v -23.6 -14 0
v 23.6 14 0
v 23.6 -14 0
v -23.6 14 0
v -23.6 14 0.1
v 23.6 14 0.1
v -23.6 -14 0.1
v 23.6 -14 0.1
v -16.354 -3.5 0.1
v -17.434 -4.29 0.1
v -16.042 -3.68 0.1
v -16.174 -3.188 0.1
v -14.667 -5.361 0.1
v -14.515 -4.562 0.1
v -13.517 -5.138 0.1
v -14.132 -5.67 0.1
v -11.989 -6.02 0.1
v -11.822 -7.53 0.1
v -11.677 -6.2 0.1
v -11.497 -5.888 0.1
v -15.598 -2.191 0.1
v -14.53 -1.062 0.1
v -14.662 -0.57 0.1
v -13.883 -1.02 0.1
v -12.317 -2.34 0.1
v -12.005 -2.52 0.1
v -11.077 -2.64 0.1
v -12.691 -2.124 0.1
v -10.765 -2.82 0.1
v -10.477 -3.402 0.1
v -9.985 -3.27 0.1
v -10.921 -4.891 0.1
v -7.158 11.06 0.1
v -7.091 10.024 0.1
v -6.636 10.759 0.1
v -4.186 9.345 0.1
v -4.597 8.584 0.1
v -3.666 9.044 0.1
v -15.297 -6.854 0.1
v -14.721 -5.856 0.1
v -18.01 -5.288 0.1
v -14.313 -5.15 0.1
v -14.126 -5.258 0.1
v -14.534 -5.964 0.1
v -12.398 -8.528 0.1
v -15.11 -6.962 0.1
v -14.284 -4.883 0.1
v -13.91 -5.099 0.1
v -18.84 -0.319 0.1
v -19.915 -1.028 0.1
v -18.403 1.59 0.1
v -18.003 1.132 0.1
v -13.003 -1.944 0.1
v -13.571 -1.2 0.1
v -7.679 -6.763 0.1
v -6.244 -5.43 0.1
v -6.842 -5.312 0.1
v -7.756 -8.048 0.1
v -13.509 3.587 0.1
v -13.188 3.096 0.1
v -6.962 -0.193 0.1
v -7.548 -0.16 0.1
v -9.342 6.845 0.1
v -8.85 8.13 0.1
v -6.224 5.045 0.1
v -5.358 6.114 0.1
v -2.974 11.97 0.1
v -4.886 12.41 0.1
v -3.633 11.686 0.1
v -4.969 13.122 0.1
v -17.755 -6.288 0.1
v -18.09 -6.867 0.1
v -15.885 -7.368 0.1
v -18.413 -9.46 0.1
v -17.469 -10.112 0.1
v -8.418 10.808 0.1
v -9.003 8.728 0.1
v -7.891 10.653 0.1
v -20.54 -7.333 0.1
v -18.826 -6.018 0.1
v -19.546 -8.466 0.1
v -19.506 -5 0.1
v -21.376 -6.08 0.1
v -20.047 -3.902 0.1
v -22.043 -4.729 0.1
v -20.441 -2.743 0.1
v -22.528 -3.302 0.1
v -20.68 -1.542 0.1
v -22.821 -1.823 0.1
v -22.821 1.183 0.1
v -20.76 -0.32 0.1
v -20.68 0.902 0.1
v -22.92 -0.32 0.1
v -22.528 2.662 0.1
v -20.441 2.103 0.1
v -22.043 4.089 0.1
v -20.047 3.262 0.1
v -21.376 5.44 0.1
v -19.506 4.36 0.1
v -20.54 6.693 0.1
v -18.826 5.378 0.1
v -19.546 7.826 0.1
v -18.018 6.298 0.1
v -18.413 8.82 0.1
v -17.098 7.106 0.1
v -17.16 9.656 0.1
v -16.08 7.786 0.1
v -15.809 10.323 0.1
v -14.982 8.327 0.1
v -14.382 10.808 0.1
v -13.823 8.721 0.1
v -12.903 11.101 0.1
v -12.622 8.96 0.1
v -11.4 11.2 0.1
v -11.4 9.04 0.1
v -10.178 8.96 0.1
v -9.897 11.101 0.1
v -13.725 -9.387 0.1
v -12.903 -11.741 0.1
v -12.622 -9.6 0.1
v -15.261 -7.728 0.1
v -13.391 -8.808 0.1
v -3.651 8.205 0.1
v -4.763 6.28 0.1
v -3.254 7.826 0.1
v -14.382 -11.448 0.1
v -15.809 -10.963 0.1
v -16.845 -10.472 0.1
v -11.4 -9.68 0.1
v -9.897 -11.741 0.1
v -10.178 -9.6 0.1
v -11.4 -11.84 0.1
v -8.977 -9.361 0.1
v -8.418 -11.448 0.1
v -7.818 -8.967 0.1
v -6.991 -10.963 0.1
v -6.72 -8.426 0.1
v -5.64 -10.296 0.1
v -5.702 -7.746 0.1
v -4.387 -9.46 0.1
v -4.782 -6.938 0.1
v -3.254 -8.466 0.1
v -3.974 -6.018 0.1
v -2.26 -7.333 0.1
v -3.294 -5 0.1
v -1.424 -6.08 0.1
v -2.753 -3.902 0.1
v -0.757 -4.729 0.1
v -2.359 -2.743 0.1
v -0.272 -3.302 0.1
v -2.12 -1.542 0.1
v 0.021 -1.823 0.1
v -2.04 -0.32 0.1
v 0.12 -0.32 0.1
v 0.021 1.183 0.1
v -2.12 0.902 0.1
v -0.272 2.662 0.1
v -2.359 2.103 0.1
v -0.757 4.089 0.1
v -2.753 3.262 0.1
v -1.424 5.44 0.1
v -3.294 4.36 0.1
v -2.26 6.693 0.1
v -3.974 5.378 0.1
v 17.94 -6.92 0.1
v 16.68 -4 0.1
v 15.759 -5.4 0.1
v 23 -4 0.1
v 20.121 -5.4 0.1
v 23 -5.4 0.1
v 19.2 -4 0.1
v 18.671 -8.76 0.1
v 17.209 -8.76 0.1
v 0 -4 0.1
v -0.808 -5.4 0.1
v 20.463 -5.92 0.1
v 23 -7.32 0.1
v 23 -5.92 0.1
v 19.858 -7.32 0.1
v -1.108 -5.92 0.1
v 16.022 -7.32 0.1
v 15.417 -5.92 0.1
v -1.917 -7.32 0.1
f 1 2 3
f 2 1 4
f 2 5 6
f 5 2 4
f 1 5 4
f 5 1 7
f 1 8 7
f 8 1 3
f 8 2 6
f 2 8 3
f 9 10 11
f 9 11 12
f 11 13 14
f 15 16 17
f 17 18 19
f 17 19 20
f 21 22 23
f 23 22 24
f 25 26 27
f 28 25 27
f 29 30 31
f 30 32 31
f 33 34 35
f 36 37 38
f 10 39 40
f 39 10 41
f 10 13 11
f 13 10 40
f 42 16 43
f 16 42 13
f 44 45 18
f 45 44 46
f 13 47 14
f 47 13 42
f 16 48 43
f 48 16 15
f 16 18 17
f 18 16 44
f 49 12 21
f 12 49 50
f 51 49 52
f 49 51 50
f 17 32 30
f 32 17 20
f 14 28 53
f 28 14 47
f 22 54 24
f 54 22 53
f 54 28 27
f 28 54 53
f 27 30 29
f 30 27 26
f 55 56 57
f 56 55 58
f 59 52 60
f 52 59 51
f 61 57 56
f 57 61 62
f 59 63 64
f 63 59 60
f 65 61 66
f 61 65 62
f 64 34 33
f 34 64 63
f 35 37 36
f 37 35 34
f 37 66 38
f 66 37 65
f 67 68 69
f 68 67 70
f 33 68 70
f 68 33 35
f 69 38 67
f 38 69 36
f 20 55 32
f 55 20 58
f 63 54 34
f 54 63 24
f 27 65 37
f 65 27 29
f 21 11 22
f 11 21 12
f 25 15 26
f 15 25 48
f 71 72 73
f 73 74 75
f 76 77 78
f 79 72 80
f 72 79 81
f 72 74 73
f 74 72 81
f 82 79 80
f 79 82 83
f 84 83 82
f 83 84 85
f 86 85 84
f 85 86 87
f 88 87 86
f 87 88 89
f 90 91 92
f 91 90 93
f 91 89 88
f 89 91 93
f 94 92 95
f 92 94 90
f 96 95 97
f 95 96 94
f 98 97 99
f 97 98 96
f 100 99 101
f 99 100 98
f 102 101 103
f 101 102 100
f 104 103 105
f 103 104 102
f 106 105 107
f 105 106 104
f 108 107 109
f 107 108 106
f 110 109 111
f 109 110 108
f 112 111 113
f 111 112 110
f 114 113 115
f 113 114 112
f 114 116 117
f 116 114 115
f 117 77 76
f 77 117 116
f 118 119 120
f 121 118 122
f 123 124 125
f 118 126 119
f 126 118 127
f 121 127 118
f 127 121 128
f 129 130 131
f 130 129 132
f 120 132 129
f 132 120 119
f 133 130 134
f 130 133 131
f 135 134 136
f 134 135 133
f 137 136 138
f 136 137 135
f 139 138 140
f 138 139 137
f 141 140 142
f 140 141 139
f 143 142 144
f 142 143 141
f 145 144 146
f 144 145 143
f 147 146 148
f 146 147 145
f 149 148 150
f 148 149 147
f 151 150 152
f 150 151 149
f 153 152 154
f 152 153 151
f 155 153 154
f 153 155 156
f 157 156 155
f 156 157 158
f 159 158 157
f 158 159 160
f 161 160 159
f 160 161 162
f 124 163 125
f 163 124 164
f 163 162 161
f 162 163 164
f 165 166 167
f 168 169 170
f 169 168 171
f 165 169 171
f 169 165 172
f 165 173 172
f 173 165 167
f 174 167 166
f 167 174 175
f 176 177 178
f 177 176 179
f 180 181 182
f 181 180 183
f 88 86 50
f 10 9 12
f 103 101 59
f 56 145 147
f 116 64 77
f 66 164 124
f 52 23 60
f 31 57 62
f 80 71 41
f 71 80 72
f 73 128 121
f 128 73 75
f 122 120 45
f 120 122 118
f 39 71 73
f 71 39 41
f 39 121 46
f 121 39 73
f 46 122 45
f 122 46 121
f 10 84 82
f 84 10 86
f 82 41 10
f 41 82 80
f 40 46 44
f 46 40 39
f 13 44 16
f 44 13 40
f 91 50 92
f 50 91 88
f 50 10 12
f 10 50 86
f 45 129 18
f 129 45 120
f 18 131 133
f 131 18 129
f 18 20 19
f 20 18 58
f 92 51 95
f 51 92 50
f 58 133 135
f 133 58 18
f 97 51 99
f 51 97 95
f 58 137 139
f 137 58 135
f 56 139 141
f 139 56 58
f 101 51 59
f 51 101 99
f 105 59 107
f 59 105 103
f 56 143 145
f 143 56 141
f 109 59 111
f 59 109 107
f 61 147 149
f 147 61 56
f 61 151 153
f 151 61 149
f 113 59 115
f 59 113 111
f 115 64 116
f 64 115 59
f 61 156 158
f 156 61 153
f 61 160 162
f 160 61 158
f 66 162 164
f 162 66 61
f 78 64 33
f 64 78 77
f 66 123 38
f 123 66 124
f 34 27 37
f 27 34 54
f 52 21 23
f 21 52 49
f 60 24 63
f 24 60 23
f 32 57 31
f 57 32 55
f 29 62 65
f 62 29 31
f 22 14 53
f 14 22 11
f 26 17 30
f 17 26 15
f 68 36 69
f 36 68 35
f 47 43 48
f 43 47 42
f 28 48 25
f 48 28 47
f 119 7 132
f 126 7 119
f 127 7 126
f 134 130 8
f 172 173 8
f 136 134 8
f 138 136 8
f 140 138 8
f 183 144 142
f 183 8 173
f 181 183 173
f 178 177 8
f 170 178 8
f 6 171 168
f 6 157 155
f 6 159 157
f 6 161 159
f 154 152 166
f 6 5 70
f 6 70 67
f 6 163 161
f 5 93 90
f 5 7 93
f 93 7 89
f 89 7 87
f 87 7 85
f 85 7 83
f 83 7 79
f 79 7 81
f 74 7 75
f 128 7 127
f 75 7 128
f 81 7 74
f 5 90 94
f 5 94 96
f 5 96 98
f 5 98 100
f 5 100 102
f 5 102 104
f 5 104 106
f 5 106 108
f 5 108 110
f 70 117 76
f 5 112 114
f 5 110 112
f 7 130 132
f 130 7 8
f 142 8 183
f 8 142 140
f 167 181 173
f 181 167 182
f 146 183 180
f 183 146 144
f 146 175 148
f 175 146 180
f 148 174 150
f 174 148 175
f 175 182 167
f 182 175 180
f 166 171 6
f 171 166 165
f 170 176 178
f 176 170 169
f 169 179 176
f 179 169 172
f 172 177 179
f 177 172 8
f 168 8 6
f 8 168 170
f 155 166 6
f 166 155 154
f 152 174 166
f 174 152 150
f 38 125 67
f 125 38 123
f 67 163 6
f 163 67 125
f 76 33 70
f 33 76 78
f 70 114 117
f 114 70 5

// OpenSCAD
// file: ../p/logo-launchcommand-bg.scad
use <../lib.scad>
function ldraw_lib__logo_launchcommand_bg() = [
// 0 Launch Command Logo Background (without Border)
// 0 Name: logo-launchcommand-bg.dat
// 0 Author: Chris Böhnke [KnightOfTarenta]
// 0 !LDRAW_ORG Primitive UPDATE 2025-05
// 0 !LICENSE Licensed under CC BY 4.0 : see CAreadme.txt
// 
// 0 !HELP Dimensions X = 32; Z = 34.67
// 
// 0 BFC CERTIFY CCW
  [0,"BFC","CERTIFY"],
  [0,"BFC","CCW"],
// 
// 0 !HISTORY 2025-04-27 [OrionP] Official Update 2025-04
// 0 !HISTORY 2025-05-24 [Holly-Wood] Updated description
// 0 !HISTORY 2025-05-28 [OrionP] Official Update 2025-05
// 
// 0 // Colour 16 Main Colour
// 3 16 -12.889 0 -1.697 -12.557 0 -3.365 -11.826 0 -.984
  [3,16,-12.889,0,-1.697,-12.557,0,-3.365,-11.826,0,-.984],
// 3 16 -8.38 0 -5.514 -6.88 0 -4.417 -6.63 0 -3.984
  [3,16,-8.38,0,-5.514,-6.88,0,-4.417,-6.63,0,-3.984],
// 3 16 -9.192 0 9.192 -10.314 0 7.914 -2.929 0 5.426
  [3,16,-9.192,0,9.192,-10.314,0,7.914,-2.929,0,5.426],
// 3 16 7.161 0 -7.097 11.258 0 -6.5 12.01 0 -4.975
  [3,16,7.161,0,-7.097,11.258,0,-6.5,12.01,0,-4.975],
// 3 16 1.697 0 12.889 3.542 0 11.736 3.329 0 12.566
  [3,16,1.697,0,12.889,3.542,0,11.736,3.329,0,12.566],
// 3 16 8.392 0 8.936 10.314 0 7.914 9.218 0 9.166
  [3,16,8.392,0,8.936,10.314,0,7.914,9.218,0,9.166],
// 3 16 -9.171 0 2.016 -4.53 0 -.347 -2.483 0 4.744
  [3,16,-9.171,0,2.016,-4.53,0,-.347,-2.483,0,4.744],
// 3 16 1.965 0 -4.097 6.331 0 -6.934 5.35 0 .222
  [3,16,1.965,0,-4.097,6.331,0,-6.934,5.35,0,.222],
// 4 16 -9.18 0 -6.9 -10.314 0 -7.914 -9.291 0 -9.093 -8.827 0 -8.289
  [4,16,-9.18,0,-6.9,-10.314,0,-7.914,-9.291,0,-9.093,-8.827,0,-8.289],
// 4 16 -7.563 0 -14.1 -5.363 0 -10.289 -6.229 0 -9.789 -8.429 0 -13.6
  [4,16,-7.563,0,-14.1,-5.363,0,-10.289,-6.229,0,-9.789,-8.429,0,-13.6],
// 4 16 -1.386 0 -11.4 -2.765 0 -11.789 -3.229 0 -12.593 -1.697 0 -12.889
  [4,16,-1.386,0,-11.4,-2.765,0,-11.789,-3.229,0,-12.593,-1.697,0,-12.889],
// 4 16 -9.18 0 -6.9 -8.827 0 -8.289 -6.229 0 -9.789 -5.413 0 -9.075
  [4,16,-9.18,0,-6.9,-8.827,0,-8.289,-6.229,0,-9.789,-5.413,0,-9.075],
// 4 16 -5.413 0 -9.075 -6.229 0 -9.789 -5.363 0 -10.289 -5.153 0 -9.225
  [4,16,-5.413,0,-9.075,-6.229,0,-9.789,-5.363,0,-10.289,-5.153,0,-9.225],
// 4 16 -1.386 0 -11.4 -5.153 0 -9.225 -5.363 0 -10.289 -2.765 0 -11.789
  [4,16,-1.386,0,-11.4,-5.153,0,-9.225,-5.363,0,-10.289,-2.765,0,-11.789],
// 4 16 -12.557 0 -3.365 -12.01 0 -4.975 -11.258 0 -6.5 -8.38 0 -5.514
  [4,16,-12.557,0,-3.365,-12.01,0,-4.975,-11.258,0,-6.5,-8.38,0,-5.514],
// 4 16 -10.314 0 -7.914 -9.18 0 -6.9 -8.38 0 -5.514 -11.258 0 -6.5
  [4,16,-10.314,0,-7.914,-9.18,0,-6.9,-8.38,0,-5.514,-11.258,0,-6.5],
// 4 16 -4.613 0 -7.689 -5.413 0 -9.075 -5.153 0 -9.225 -4.353 0 -7.839
  [4,16,-4.613,0,-7.689,-5.413,0,-9.075,-5.153,0,-9.225,-4.353,0,-7.839],
// 4 16 -3.794 0 -7.431 -4.538 0 -7.001 -4.613 0 -7.689 -4.353 0 -7.839
  [4,16,-3.794,0,-7.431,-4.538,0,-7.001,-4.613,0,-7.689,-4.353,0,-7.839],
// 4 16 -12.889 0 -1.697 -11.826 0 -.984 -12.889 0 1.697 -13 0 0
  [4,16,-12.889,0,-1.697,-11.826,0,-.984,-12.889,0,1.697,-13,0,0],
// 4 16 -12.557 0 -3.365 -8.38 0 -5.514 -6.63 0 -3.984 -11.826 0 -.984
  [4,16,-12.557,0,-3.365,-8.38,0,-5.514,-6.63,0,-3.984,-11.826,0,-.984],
// 4 16 -1.697 0 -12.889 0 0 -13 -.586 0 -10.014 -1.386 0 -11.4
  [4,16,-1.697,0,-12.889,0,0,-13,-.586,0,-10.014,-1.386,0,-11.4],
// 4 16 0 0 -13 1.697 0 -12.889 3.365 0 -12.557 -.586 0 -10.014
  [4,16,0,0,-13,1.697,0,-12.889,3.365,0,-12.557,-.586,0,-10.014],
// 4 16 5.061 0 -10.734 -.135 0 -7.734 -.385 0 -8.167 -.586 0 -10.014
  [4,16,5.061,0,-10.734,-.135,0,-7.734,-.385,0,-8.167,-.586,0,-10.014],
// 4 16 -11.826 0 -.984 -9.726 0 2.653 -12.557 0 3.365 -12.889 0 1.697
  [4,16,-11.826,0,-.984,-9.726,0,2.653,-12.557,0,3.365,-12.889,0,1.697],
// 4 16 -.586 0 -10.014 3.365 0 -12.557 4.975 0 -12.01 5.061 0 -10.734
  [4,16,-.586,0,-10.014,3.365,0,-12.557,4.975,0,-12.01,5.061,0,-10.734],
// 4 16 -12.557 0 3.365 -9.726 0 2.653 -11.258 0 6.5 -12.01 0 4.975
  [4,16,-12.557,0,3.365,-9.726,0,2.653,-11.258,0,6.5,-12.01,0,4.975],
// 4 16 4.975 0 -12.01 6.5 0 -11.258 7.914 0 -10.314 5.061 0 -10.734
  [4,16,4.975,0,-12.01,6.5,0,-11.258,7.914,0,-10.314,5.061,0,-10.734],
// 4 16 5.061 0 -10.734 7.914 0 -10.314 9.192 0 -9.192 7.161 0 -7.097
  [4,16,5.061,0,-10.734,7.914,0,-10.314,9.192,0,-9.192,7.161,0,-7.097],
// 4 16 -11.258 0 6.5 -9.726 0 2.653 -2.929 0 5.426 -10.314 0 7.914
  [4,16,-11.258,0,6.5,-9.726,0,2.653,-2.929,0,5.426,-10.314,0,7.914],
// 4 16 -6.5 0 11.258 -7.914 0 10.314 -9.192 0 9.192 -2.929 0 5.426
  [4,16,-6.5,0,11.258,-7.914,0,10.314,-9.192,0,9.192,-2.929,0,5.426],
// 4 16 9.192 0 -9.192 10.314 0 -7.914 11.258 0 -6.5 7.161 0 -7.097
  [4,16,9.192,0,-9.192,10.314,0,-7.914,11.258,0,-6.5,7.161,0,-7.097],
// 4 16 -3.365 0 12.557 -4.975 0 12.01 -6.5 0 11.258 -2.929 0 5.426
  [4,16,-3.365,0,12.557,-4.975,0,12.01,-6.5,0,11.258,-2.929,0,5.426],
// 4 16 7.161 0 -7.097 12.01 0 -4.975 12.557 0 -3.365 6.164 0 .176
  [4,16,7.161,0,-7.097,12.01,0,-4.975,12.557,0,-3.365,6.164,0,.176],
// 4 16 12.557 0 -3.365 12.889 0 -1.697 13 0 0 6.164 0 .176
  [4,16,12.557,0,-3.365,12.889,0,-1.697,13,0,0,6.164,0,.176],
// 4 16 -3.365 0 12.557 -2.929 0 5.426 0 0 13 -1.697 0 12.889
  [4,16,-3.365,0,12.557,-2.929,0,5.426,0,0,13,-1.697,0,12.889],
// 4 16 -2.929 0 5.426 3.542 0 11.736 1.697 0 12.889 0 0 13
  [4,16,-2.929,0,5.426,3.542,0,11.736,1.697,0,12.889,0,0,13],
// 4 16 13 0 0 12.889 0 1.697 12.557 0 3.365 6.164 0 .176
  [4,16,13,0,0,12.889,0,1.697,12.557,0,3.365,6.164,0,.176],
// 4 16 11.258 0 6.5 6.164 0 .176 12.557 0 3.365 12.01 0 4.975
  [4,16,11.258,0,6.5,6.164,0,.176,12.557,0,3.365,12.01,0,4.975],
// 4 16 10.314 0 7.914 8.392 0 8.936 6.164 0 .176 11.258 0 6.5
  [4,16,10.314,0,7.914,8.392,0,8.936,6.164,0,.176,11.258,0,6.5],
// 4 16 5.892 0 15.806 4.873 0 15.24 3.329 0 12.566 3.542 0 11.736
  [4,16,5.892,0,15.806,4.873,0,15.24,3.329,0,12.566,3.542,0,11.736],
// 4 16 10.742 0 13.006 8.392 0 8.936 9.218 0 9.166 10.762 0 11.84
  [4,16,10.742,0,13.006,8.392,0,8.936,9.218,0,9.166,10.762,0,11.84],
// 4 16 .449 0 -3.222 9.449 0 12.367 5.985 0 14.367 -3.015 0 -1.222
  [4,16,.449,0,-3.222,9.449,0,12.367,5.985,0,14.367,-3.015,0,-1.222],
// 4 16 -10.334 0 .002 -5.83 0 -2.598 -4.53 0 -.347 -9.171 0 2.016
  [4,16,-10.334,0,.002,-5.83,0,-2.598,-4.53,0,-.347,-9.171,0,2.016],
// 4 16 2.859 0 9.952 -2.483 0 4.744 -4.53 0 -.347 -3.448 0 -.972
  [4,16,2.859,0,9.952,-2.483,0,4.744,-4.53,0,-.347,-3.448,0,-.972],
// 4 16 1.965 0 -4.097 .665 0 -6.348 5.168 0 -8.948 6.331 0 -6.934
  [4,16,1.965,0,-4.097,.665,0,-6.348,5.168,0,-8.948,6.331,0,-6.934],
// 4 16 7.189 0 7.452 .882 0 -3.472 1.965 0 -4.097 5.35 0 .222
  [4,16,7.189,0,7.452,.882,0,-3.472,1.965,0,-4.097,5.35,0,.222],
// 4 16 -6.447 0 -4.667 -4.326 0 -5.892 -2.226 0 -2.255 -4.347 0 -1.03
  [4,16,-6.447,0,-4.667,-4.326,0,-5.892,-2.226,0,-2.255,-4.347,0,-1.03],
// 4 16 -.818 0 -7.917 1.282 0 -4.28 -.84 0 -3.055 -2.94 0 -6.692
  [4,16,-.818,0,-7.917,1.282,0,-4.28,-.84,0,-3.055,-2.94,0,-6.692],
// 4 16 10.019 0 13.424 10.787 0 16.675 9.047 0 17.68 6.616 0 15.388
  [4,16,10.019,0,13.424,10.787,0,16.675,9.047,0,17.68,6.616,0,15.388],
// 4 16 -4.046 0 -6.708 -3.786 0 -6.858 -3.486 0 -6.638 -4.006 0 -6.338
  [4,16,-4.046,0,-6.708,-3.786,0,-6.858,-3.486,0,-6.638,-4.006,0,-6.338],
// 4 16 -3.486 0 -6.638 -1.273 0 -2.805 -1.793 0 -2.505 -4.006 0 -6.338
  [4,16,-3.486,0,-6.638,-1.273,0,-2.805,-1.793,0,-2.505,-4.006,0,-6.338],
];
module ldraw_lib__logo_launchcommand_bg(step=0, col=false, unit=2/5, alt=false, line=0.2, solid=!$preview)
    makepoly(ldraw_lib__logo_launchcommand_bg(), step=step, col=col, unit=unit, alt=alt, line=line, solid=solid);
ldraw_lib__logo_launchcommand_bg(line=0.2);
// file: ../p/box5-12.scad
use <../lib.scad>
function ldraw_lib__box5_12() = [
// 0 Box with 5 Faces without Any Edges
// 0 Name: box5-12.dat
// 0 Author: Chris Dee [cwdee]
// 0 !LDRAW_ORG Primitive UPDATE 2009-02
// 0 !LICENSE Licensed under CC BY 4.0 : see CAreadme.txt
// 
// 0 BFC CERTIFY CCW
  [0,"BFC","CERTIFY"],
  [0,"BFC","CCW"],
// 
// 0 !HISTORY 2009-09-03 [PTadmin] Official Update 2009-02
// 
// 
// 4 16 1 1 1 1 1 -1 -1 1 -1 -1 1 1
  [4,16,1,1,1,1,1,-1,-1,1,-1,-1,1,1],
// 4 16 -1 0 1 1 0 1 1 1 1 -1 1 1
  [4,16,-1,0,1,1,0,1,1,1,1,-1,1,1],
// 4 16 -1 0 -1 -1 0 1 -1 1 1 -1 1 -1
  [4,16,-1,0,-1,-1,0,1,-1,1,1,-1,1,-1],
// 4 16 1 0 -1 -1 0 -1 -1 1 -1 1 1 -1
  [4,16,1,0,-1,-1,0,-1,-1,1,-1,1,1,-1],
// 4 16 1 0 1 1 0 -1 1 1 -1 1 1 1
  [4,16,1,0,1,1,0,-1,1,1,-1,1,1,1],
// 0
];
module ldraw_lib__box5_12(step=0, col=false, unit=2/5, alt=false, line=0.2, solid=!$preview)
    makepoly(ldraw_lib__box5_12(), step=step, col=col, unit=unit, alt=alt, line=line, solid=solid);
ldraw_lib__box5_12(line=0.2);
// main file
use <../lib.scad>
use <../p/box5-12.scad>
use <../p/logo-launchcommand-bg.scad>
use <../p/logo-launchcommand.scad>
function ldraw_lib__169665j() = [
// 0 Sticker  3.5 x  5.9 with Launch Command Logo, Blue V and Red Lines
// 0 Name: 169665j.dat
// 0 Author: Chris Böhnke [KnightOfTarenta]
// 0 !LDRAW_ORG Part UPDATE 2026-06
// 0 !LICENSE Licensed under CC BY 4.0 : see CAreadme.txt
// 
// 0 !HELP place on back 3009.dat at 0 -12 -10
// 
// 0 BFC CERTIFY CCW
  [0,"BFC","CERTIFY"],
  [0,"BFC","CCW"],
// 
// 0 !KEYWORDS Bricklink 6339stk01, Brickowl 588738, Launch Command
// 0 !KEYWORDS Rebrickable 169665, set 6339, Shuttle Launch Pad, Sign Board
// 0 !KEYWORDS space port, stamp, town
// 
// 0 !HISTORY 2026-06-28 [OrionP] Official Update 2026-06
// 
// 0 // Sticker Base
// 1 16 0 -.25 0 59 0 0 0 .25 0 0 0 35 box5-12.dat
  [1,16,0,-.25,0,59,0,0,0,.25,0,0,0,35, ldraw_lib__box5_12()],
// 
// 0 // Pattern
// 0 BFC NOCLIP
  [0,"BFC","NOCLIP"],
// 1 16 -28.5 -.25 -.8 1.8 0 0 0 1 0 0 0 1.8 logo-launchcommand.dat
  [1,16,-28.5,-.25,-.8,1.8,0,0,0,1,0,0,0,1.8, ldraw_lib__logo_launchcommand()],
// 
// 0 // Colour 1 Blue
// 3 1 44.85 -.25 -17.3 41.7 -.25 -10 39.398 -.25 -13.5
  [3,1,44.85,-.25,-17.3,41.7,-.25,-10,39.398,-.25,-13.5],
// 4 1 57.5 -.25 -13.5 57.5 -.25 -10 48 -.25 -10 50.302 -.25 -13.5
  [4,1,57.5,-.25,-13.5,57.5,-.25,-10,48,-.25,-10,50.302,-.25,-13.5],
// 4 1 46.677 -.25 -21.9 50.302 -.25 -13.5 48 -.25 -10 44.85 -.25 -17.3
  [4,1,46.677,-.25,-21.9,50.302,-.25,-13.5,48,-.25,-10,44.85,-.25,-17.3],
// 4 1 46.677 -.25 -21.9 44.85 -.25 -17.3 39.398 -.25 -13.5 43.023 -.25 -21.9
  [4,1,46.677,-.25,-21.9,44.85,-.25,-17.3,39.398,-.25,-13.5,43.023,-.25,-21.9],
// 4 1 41.7 -.25 -10 0 -.25 -10 -2.021 -.25 -13.5 39.398 -.25 -13.5
  [4,1,41.7,-.25,-10,0,-.25,-10,-2.021,-.25,-13.5,39.398,-.25,-13.5],
// 
// 0 // Colour 4 Red
// 4 4 57.5 -.25 -14.8 51.157 -.25 -14.8 49.646 -.25 -18.3 57.5 -.25 -18.3
  [4,4,57.5,-.25,-14.8,51.157,-.25,-14.8,49.646,-.25,-18.3,57.5,-.25,-18.3],
// 4 4 38.543 -.25 -14.8 -2.771 -.25 -14.8 -4.792 -.25 -18.3 40.054 -.25 -18.3
  [4,4,38.543,-.25,-14.8,-2.771,-.25,-14.8,-4.792,-.25,-18.3,40.054,-.25,-18.3],
// 
// 0 BFC CLIP
  [0,"BFC","CLIP"],
// 0 // Colour 16 Main Colour
// 1 16 -28.5 -.25 -.8 1.8 0 0 0 1 0 0 0 1.8 logo-launchcommand-bg.dat
  [1,16,-28.5,-.25,-.8,1.8,0,0,0,1,0,0,0,1.8, ldraw_lib__logo_launchcommand_bg()],
// 3 16 -32.2584 -.25 -29.3534 -59 -.25 -35 -28.5 -.25 -29.6
  [3,16,-32.2584,-.25,-29.3534,-59,-.25,-35,-28.5,-.25,-29.6],
// 3 16 -35.9538 -.25 -28.619 -59 -.25 -35 -32.2584 -.25 -29.3534
  [3,16,-35.9538,-.25,-28.619,-59,-.25,-35,-32.2584,-.25,-29.3534],
// 3 16 -39.5214 -.25 -27.4076 -59 -.25 -35 -35.9538 -.25 -28.619
  [3,16,-39.5214,-.25,-27.4076,-59,-.25,-35,-35.9538,-.25,-28.619],
// 3 16 -21.0462 -.25 -28.619 -24.7416 -.25 -29.3534 59 -.25 -35
  [3,16,-21.0462,-.25,-28.619,-24.7416,-.25,-29.3534,59,-.25,-35],
// 3 16 46.677 -.25 -21.9 43.023 -.25 -21.9 59 -.25 -35
  [3,16,46.677,-.25,-21.9,43.023,-.25,-21.9,59,-.25,-35],
// 3 16 -17.4786 -.25 -27.4076 -21.0462 -.25 -28.619 59 -.25 -35
  [3,16,-17.4786,-.25,-27.4076,-21.0462,-.25,-28.619,59,-.25,-35],
// 3 16 -14.1 -.25 -25.7408 -17.4786 -.25 -27.4076 59 -.25 -35
  [3,16,-14.1,-.25,-25.7408,-17.4786,-.25,-27.4076,59,-.25,-35],
// 3 16 -10.968 -.25 -23.6492 -14.1 -.25 -25.7408 59 -.25 -35
  [3,16,-10.968,-.25,-23.6492,-14.1,-.25,-25.7408,59,-.25,-35],
// 3 16 -4.792 -.25 -18.3 -5.6508 -.25 -18.332 -8.1348 -.25 -21.1652
  [3,16,-4.792,-.25,-18.3,-5.6508,-.25,-18.332,-8.1348,-.25,-21.1652],
// 3 16 -4.792 -.25 -18.3 59 -.25 -35 43.023 -.25 -21.9
  [3,16,-4.792,-.25,-18.3,59,-.25,-35,43.023,-.25,-21.9],
// 3 16 40.054 -.25 -18.3 -4.792 -.25 -18.3 43.023 -.25 -21.9
  [3,16,40.054,-.25,-18.3,-4.792,-.25,-18.3,43.023,-.25,-21.9],
// 3 16 57.5 -.25 -14.8 57.5 -.25 -18.3 59 -.25 -35
  [3,16,57.5,-.25,-14.8,57.5,-.25,-18.3,59,-.25,-35],
// 3 16 57.5 -.25 -13.5 57.5 -.25 -14.8 59 -.25 -35
  [3,16,57.5,-.25,-13.5,57.5,-.25,-14.8,59,-.25,-35],
// 3 16 59 -.25 35 48 -.25 -10 57.5 -.25 -10
  [3,16,59,-.25,35,48,-.25,-10,57.5,-.25,-10],
// 3 16 59 -.25 35 -.681 -.25 6.6538 .0534 -.25 2.9584
  [3,16,59,-.25,35,-.681,-.25,6.6538,.0534,-.25,2.9584],
// 3 16 59 -.25 35 -1.8924 -.25 10.2214 -.681 -.25 6.6538
  [3,16,59,-.25,35,-1.8924,-.25,10.2214,-.681,-.25,6.6538],
// 3 16 59 -.25 35 -3.5592 -.25 13.6 -1.8924 -.25 10.2214
  [3,16,59,-.25,35,-3.5592,-.25,13.6,-1.8924,-.25,10.2214],
// 3 16 .3 -.25 -.8 .0534 -.25 -4.5584 41.7 -.25 -10
  [3,16,.3,-.25,-.8,.0534,-.25,-4.5584,41.7,-.25,-10],
// 3 16 59 -.25 35 -59 -.25 35 -12.4224 -.25 32.806
  [3,16,59,-.25,35,-59,-.25,35,-12.4224,-.25,32.806],
// 3 16 59 -.25 35 -12.4224 -.25 32.806 -7.4346 -.25 29.926
  [3,16,59,-.25,35,-12.4224,-.25,32.806,-7.4346,-.25,29.926],
// 3 16 59 -.25 35 -5.6508 -.25 16.732 -3.5592 -.25 13.6
  [3,16,59,-.25,35,-5.6508,-.25,16.732,-3.5592,-.25,13.6],
// 3 16 -59 -.25 35 -57.3 -.25 -.8 -57.0534 -.25 2.9584
  [3,16,-59,-.25,35,-57.3,-.25,-.8,-57.0534,-.25,2.9584],
// 3 16 -59 -.25 35 -59 -.25 -35 -57.3 -.25 -.8
  [3,16,-59,-.25,35,-59,-.25,-35,-57.3,-.25,-.8],
// 3 16 -57.3 -.25 -.8 -59 -.25 -35 -57.0534 -.25 -4.5584
  [3,16,-57.3,-.25,-.8,-59,-.25,-35,-57.0534,-.25,-4.5584],
// 3 16 -57.0534 -.25 -4.5584 -59 -.25 -35 -56.319 -.25 -8.2538
  [3,16,-57.0534,-.25,-4.5584,-59,-.25,-35,-56.319,-.25,-8.2538],
// 3 16 -56.319 -.25 -8.2538 -59 -.25 -35 -55.1076 -.25 -11.8214
  [3,16,-56.319,-.25,-8.2538,-59,-.25,-35,-55.1076,-.25,-11.8214],
// 3 16 -55.1076 -.25 -11.8214 -59 -.25 -35 -53.4408 -.25 -15.2
  [3,16,-55.1076,-.25,-11.8214,-59,-.25,-35,-53.4408,-.25,-15.2],
// 3 16 -53.4408 -.25 -15.2 -59 -.25 -35 -51.3492 -.25 -18.332
  [3,16,-53.4408,-.25,-15.2,-59,-.25,-35,-51.3492,-.25,-18.332],
// 3 16 -51.3492 -.25 -18.332 -59 -.25 -35 -48.8652 -.25 -21.1652
  [3,16,-51.3492,-.25,-18.332,-59,-.25,-35,-48.8652,-.25,-21.1652],
// 3 16 -46.032 -.25 -23.6492 -59 -.25 -35 -43.6722 -.25 -25.28
  [3,16,-46.032,-.25,-23.6492,-59,-.25,-35,-43.6722,-.25,-25.28],
// 3 16 -42.1134 -.25 -26.18 -59 -.25 -35 -39.5214 -.25 -27.4076
  [3,16,-42.1134,-.25,-26.18,-59,-.25,-35,-39.5214,-.25,-27.4076],
// 3 16 -43.6722 -.25 -25.28 -59 -.25 -35 -42.1134 -.25 -26.18
  [3,16,-43.6722,-.25,-25.28,-59,-.25,-35,-42.1134,-.25,-26.18],
// 3 16 -48.8652 -.25 -21.1652 -59 -.25 -35 -46.032 -.25 -23.6492
  [3,16,-48.8652,-.25,-21.1652,-59,-.25,-35,-46.032,-.25,-23.6492],
// 3 16 -59 -.25 35 -57.0534 -.25 2.9584 -56.319 -.25 6.6538
  [3,16,-59,-.25,35,-57.0534,-.25,2.9584,-56.319,-.25,6.6538],
// 3 16 -59 -.25 35 -56.319 -.25 6.6538 -55.1076 -.25 10.2214
  [3,16,-59,-.25,35,-56.319,-.25,6.6538,-55.1076,-.25,10.2214],
// 3 16 -59 -.25 35 -55.1076 -.25 10.2214 -53.4408 -.25 13.6
  [3,16,-59,-.25,35,-55.1076,-.25,10.2214,-53.4408,-.25,13.6],
// 3 16 -59 -.25 35 -53.4408 -.25 13.6 -51.3492 -.25 16.732
  [3,16,-59,-.25,35,-53.4408,-.25,13.6,-51.3492,-.25,16.732],
// 3 16 -59 -.25 35 -51.3492 -.25 16.732 -48.8652 -.25 19.5652
  [3,16,-59,-.25,35,-51.3492,-.25,16.732,-48.8652,-.25,19.5652],
// 3 16 -59 -.25 35 -48.8652 -.25 19.5652 -46.032 -.25 22.0492
  [3,16,-59,-.25,35,-48.8652,-.25,19.5652,-46.032,-.25,22.0492],
// 3 16 -59 -.25 35 -46.032 -.25 22.0492 -42.9 -.25 24.1408
  [3,16,-59,-.25,35,-46.032,-.25,22.0492,-42.9,-.25,24.1408],
// 3 16 -59 -.25 35 -42.9 -.25 24.1408 -39.5214 -.25 25.8076
  [3,16,-59,-.25,35,-42.9,-.25,24.1408,-39.5214,-.25,25.8076],
// 3 16 -59 -.25 35 -39.5214 -.25 25.8076 -35.9538 -.25 27.019
  [3,16,-59,-.25,35,-39.5214,-.25,25.8076,-35.9538,-.25,27.019],
// 3 16 -12.4224 -.25 32.806 -24.7416 -.25 27.7534 -21.0462 -.25 27.019
  [3,16,-12.4224,-.25,32.806,-24.7416,-.25,27.7534,-21.0462,-.25,27.019],
// 3 16 -59 -.25 35 -32.2584 -.25 27.7534 -28.5 -.25 28
  [3,16,-59,-.25,35,-32.2584,-.25,27.7534,-28.5,-.25,28],
// 3 16 -59 -.25 35 -35.9538 -.25 27.019 -32.2584 -.25 27.7534
  [3,16,-59,-.25,35,-35.9538,-.25,27.019,-32.2584,-.25,27.7534],
// 4 16 -28.5 -.25 -29.6 -59 -.25 -35 59 -.25 -35 -24.7416 -.25 -29.3534
  [4,16,-28.5,-.25,-29.6,-59,-.25,-35,59,-.25,-35,-24.7416,-.25,-29.3534],
// 4 16 -8.1348 -.25 -21.1652 -10.968 -.25 -23.6492 59 -.25 -35 -4.792 -.25 -18.3
  [4,16,-8.1348,-.25,-21.1652,-10.968,-.25,-23.6492,59,-.25,-35,-4.792,-.25,-18.3],
// 4 16 40.054 -.25 -18.3 43.023 -.25 -21.9 39.398 -.25 -13.5 38.543 -.25 -14.8
  [4,16,40.054,-.25,-18.3,43.023,-.25,-21.9,39.398,-.25,-13.5,38.543,-.25,-14.8],
// 4 16 -3.5592 -.25 -15.2 -5.6508 -.25 -18.332 -4.792 -.25 -18.3 -2.771 -.25 -14.8
  [4,16,-3.5592,-.25,-15.2,-5.6508,-.25,-18.332,-4.792,-.25,-18.3,-2.771,-.25,-14.8],
// 4 16 -3.5592 -.25 -15.2 -2.771 -.25 -14.8 -2.021 -.25 -13.5 -1.8924 -.25 -11.8214
  [4,16,-3.5592,-.25,-15.2,-2.771,-.25,-14.8,-2.021,-.25,-13.5,-1.8924,-.25,-11.8214],
// 4 16 -1.8924 -.25 -11.8214 -2.021 -.25 -13.5 0 -.25 -10 -.681 -.25 -8.2538
  [4,16,-1.8924,-.25,-11.8214,-2.021,-.25,-13.5,0,-.25,-10,-.681,-.25,-8.2538],
// 4 16 -2.021 -.25 -13.5 -2.771 -.25 -14.8 38.543 -.25 -14.8 39.398 -.25 -13.5
  [4,16,-2.021,-.25,-13.5,-2.771,-.25,-14.8,38.543,-.25,-14.8,39.398,-.25,-13.5],
// 4 16 41.7 -.25 -10 44.85 -.25 -17.3 48 -.25 -10 59 -.25 35
  [4,16,41.7,-.25,-10,44.85,-.25,-17.3,48,-.25,-10,59,-.25,35],
// 4 16 51.157 -.25 -14.8 57.5 -.25 -14.8 57.5 -.25 -13.5 50.302 -.25 -13.5
  [4,16,51.157,-.25,-14.8,57.5,-.25,-14.8,57.5,-.25,-13.5,50.302,-.25,-13.5],
// 4 16 49.646 -.25 -18.3 51.157 -.25 -14.8 50.302 -.25 -13.5 46.677 -.25 -21.9
  [4,16,49.646,-.25,-18.3,51.157,-.25,-14.8,50.302,-.25,-13.5,46.677,-.25,-21.9],
// 4 16 57.5 -.25 -18.3 49.646 -.25 -18.3 46.677 -.25 -21.9 59 -.25 -35
  [4,16,57.5,-.25,-18.3,49.646,-.25,-18.3,46.677,-.25,-21.9,59,-.25,-35],
// 4 16 59 -.25 -35 59 -.25 35 57.5 -.25 -10 57.5 -.25 -13.5
  [4,16,59,-.25,-35,59,-.25,35,57.5,-.25,-10,57.5,-.25,-13.5],
// 4 16 .3 -.25 -.8 41.7 -.25 -10 59 -.25 35 .0534 -.25 2.9584
  [4,16,.3,-.25,-.8,41.7,-.25,-10,59,-.25,35,.0534,-.25,2.9584],
// 4 16 .0534 -.25 -4.5584 -.681 -.25 -8.2538 0 -.25 -10 41.7 -.25 -10
  [4,16,.0534,-.25,-4.5584,-.681,-.25,-8.2538,0,-.25,-10,41.7,-.25,-10],
// 4 16 -9.1644 -.25 22.6108 -9.1284 -.25 20.512 -8.1348 -.25 19.5652 -7.4346 -.25 29.926
  [4,16,-9.1644,-.25,22.6108,-9.1284,-.25,20.512,-8.1348,-.25,19.5652,-7.4346,-.25,29.926],
// 4 16 59 -.25 35 -7.4346 -.25 29.926 -8.1348 -.25 19.5652 -5.6508 -.25 16.732
  [4,16,59,-.25,35,-7.4346,-.25,29.926,-8.1348,-.25,19.5652,-5.6508,-.25,16.732],
// 4 16 -21.0462 -.25 27.019 -19.7286 -.25 26.632 -17.8944 -.25 27.6508 -12.4224 -.25 32.806
  [4,16,-21.0462,-.25,27.019,-19.7286,-.25,26.632,-17.8944,-.25,27.6508,-12.4224,-.25,32.806],
// 4 16 -28.5 -.25 28 -24.7416 -.25 27.7534 -12.4224 -.25 32.806 -59 -.25 35
  [4,16,-28.5,-.25,28,-24.7416,-.25,27.7534,-12.4224,-.25,32.806,-59,-.25,35],
];
module ldraw_lib__169665j(step=0, col=false, unit=2/5, alt=false, line=0.2, solid=!$preview)
    makepoly(ldraw_lib__169665j(), step=step, col=col, unit=unit, alt=alt, line=line, solid=solid);
ldraw_lib__169665j(line=0.2);
